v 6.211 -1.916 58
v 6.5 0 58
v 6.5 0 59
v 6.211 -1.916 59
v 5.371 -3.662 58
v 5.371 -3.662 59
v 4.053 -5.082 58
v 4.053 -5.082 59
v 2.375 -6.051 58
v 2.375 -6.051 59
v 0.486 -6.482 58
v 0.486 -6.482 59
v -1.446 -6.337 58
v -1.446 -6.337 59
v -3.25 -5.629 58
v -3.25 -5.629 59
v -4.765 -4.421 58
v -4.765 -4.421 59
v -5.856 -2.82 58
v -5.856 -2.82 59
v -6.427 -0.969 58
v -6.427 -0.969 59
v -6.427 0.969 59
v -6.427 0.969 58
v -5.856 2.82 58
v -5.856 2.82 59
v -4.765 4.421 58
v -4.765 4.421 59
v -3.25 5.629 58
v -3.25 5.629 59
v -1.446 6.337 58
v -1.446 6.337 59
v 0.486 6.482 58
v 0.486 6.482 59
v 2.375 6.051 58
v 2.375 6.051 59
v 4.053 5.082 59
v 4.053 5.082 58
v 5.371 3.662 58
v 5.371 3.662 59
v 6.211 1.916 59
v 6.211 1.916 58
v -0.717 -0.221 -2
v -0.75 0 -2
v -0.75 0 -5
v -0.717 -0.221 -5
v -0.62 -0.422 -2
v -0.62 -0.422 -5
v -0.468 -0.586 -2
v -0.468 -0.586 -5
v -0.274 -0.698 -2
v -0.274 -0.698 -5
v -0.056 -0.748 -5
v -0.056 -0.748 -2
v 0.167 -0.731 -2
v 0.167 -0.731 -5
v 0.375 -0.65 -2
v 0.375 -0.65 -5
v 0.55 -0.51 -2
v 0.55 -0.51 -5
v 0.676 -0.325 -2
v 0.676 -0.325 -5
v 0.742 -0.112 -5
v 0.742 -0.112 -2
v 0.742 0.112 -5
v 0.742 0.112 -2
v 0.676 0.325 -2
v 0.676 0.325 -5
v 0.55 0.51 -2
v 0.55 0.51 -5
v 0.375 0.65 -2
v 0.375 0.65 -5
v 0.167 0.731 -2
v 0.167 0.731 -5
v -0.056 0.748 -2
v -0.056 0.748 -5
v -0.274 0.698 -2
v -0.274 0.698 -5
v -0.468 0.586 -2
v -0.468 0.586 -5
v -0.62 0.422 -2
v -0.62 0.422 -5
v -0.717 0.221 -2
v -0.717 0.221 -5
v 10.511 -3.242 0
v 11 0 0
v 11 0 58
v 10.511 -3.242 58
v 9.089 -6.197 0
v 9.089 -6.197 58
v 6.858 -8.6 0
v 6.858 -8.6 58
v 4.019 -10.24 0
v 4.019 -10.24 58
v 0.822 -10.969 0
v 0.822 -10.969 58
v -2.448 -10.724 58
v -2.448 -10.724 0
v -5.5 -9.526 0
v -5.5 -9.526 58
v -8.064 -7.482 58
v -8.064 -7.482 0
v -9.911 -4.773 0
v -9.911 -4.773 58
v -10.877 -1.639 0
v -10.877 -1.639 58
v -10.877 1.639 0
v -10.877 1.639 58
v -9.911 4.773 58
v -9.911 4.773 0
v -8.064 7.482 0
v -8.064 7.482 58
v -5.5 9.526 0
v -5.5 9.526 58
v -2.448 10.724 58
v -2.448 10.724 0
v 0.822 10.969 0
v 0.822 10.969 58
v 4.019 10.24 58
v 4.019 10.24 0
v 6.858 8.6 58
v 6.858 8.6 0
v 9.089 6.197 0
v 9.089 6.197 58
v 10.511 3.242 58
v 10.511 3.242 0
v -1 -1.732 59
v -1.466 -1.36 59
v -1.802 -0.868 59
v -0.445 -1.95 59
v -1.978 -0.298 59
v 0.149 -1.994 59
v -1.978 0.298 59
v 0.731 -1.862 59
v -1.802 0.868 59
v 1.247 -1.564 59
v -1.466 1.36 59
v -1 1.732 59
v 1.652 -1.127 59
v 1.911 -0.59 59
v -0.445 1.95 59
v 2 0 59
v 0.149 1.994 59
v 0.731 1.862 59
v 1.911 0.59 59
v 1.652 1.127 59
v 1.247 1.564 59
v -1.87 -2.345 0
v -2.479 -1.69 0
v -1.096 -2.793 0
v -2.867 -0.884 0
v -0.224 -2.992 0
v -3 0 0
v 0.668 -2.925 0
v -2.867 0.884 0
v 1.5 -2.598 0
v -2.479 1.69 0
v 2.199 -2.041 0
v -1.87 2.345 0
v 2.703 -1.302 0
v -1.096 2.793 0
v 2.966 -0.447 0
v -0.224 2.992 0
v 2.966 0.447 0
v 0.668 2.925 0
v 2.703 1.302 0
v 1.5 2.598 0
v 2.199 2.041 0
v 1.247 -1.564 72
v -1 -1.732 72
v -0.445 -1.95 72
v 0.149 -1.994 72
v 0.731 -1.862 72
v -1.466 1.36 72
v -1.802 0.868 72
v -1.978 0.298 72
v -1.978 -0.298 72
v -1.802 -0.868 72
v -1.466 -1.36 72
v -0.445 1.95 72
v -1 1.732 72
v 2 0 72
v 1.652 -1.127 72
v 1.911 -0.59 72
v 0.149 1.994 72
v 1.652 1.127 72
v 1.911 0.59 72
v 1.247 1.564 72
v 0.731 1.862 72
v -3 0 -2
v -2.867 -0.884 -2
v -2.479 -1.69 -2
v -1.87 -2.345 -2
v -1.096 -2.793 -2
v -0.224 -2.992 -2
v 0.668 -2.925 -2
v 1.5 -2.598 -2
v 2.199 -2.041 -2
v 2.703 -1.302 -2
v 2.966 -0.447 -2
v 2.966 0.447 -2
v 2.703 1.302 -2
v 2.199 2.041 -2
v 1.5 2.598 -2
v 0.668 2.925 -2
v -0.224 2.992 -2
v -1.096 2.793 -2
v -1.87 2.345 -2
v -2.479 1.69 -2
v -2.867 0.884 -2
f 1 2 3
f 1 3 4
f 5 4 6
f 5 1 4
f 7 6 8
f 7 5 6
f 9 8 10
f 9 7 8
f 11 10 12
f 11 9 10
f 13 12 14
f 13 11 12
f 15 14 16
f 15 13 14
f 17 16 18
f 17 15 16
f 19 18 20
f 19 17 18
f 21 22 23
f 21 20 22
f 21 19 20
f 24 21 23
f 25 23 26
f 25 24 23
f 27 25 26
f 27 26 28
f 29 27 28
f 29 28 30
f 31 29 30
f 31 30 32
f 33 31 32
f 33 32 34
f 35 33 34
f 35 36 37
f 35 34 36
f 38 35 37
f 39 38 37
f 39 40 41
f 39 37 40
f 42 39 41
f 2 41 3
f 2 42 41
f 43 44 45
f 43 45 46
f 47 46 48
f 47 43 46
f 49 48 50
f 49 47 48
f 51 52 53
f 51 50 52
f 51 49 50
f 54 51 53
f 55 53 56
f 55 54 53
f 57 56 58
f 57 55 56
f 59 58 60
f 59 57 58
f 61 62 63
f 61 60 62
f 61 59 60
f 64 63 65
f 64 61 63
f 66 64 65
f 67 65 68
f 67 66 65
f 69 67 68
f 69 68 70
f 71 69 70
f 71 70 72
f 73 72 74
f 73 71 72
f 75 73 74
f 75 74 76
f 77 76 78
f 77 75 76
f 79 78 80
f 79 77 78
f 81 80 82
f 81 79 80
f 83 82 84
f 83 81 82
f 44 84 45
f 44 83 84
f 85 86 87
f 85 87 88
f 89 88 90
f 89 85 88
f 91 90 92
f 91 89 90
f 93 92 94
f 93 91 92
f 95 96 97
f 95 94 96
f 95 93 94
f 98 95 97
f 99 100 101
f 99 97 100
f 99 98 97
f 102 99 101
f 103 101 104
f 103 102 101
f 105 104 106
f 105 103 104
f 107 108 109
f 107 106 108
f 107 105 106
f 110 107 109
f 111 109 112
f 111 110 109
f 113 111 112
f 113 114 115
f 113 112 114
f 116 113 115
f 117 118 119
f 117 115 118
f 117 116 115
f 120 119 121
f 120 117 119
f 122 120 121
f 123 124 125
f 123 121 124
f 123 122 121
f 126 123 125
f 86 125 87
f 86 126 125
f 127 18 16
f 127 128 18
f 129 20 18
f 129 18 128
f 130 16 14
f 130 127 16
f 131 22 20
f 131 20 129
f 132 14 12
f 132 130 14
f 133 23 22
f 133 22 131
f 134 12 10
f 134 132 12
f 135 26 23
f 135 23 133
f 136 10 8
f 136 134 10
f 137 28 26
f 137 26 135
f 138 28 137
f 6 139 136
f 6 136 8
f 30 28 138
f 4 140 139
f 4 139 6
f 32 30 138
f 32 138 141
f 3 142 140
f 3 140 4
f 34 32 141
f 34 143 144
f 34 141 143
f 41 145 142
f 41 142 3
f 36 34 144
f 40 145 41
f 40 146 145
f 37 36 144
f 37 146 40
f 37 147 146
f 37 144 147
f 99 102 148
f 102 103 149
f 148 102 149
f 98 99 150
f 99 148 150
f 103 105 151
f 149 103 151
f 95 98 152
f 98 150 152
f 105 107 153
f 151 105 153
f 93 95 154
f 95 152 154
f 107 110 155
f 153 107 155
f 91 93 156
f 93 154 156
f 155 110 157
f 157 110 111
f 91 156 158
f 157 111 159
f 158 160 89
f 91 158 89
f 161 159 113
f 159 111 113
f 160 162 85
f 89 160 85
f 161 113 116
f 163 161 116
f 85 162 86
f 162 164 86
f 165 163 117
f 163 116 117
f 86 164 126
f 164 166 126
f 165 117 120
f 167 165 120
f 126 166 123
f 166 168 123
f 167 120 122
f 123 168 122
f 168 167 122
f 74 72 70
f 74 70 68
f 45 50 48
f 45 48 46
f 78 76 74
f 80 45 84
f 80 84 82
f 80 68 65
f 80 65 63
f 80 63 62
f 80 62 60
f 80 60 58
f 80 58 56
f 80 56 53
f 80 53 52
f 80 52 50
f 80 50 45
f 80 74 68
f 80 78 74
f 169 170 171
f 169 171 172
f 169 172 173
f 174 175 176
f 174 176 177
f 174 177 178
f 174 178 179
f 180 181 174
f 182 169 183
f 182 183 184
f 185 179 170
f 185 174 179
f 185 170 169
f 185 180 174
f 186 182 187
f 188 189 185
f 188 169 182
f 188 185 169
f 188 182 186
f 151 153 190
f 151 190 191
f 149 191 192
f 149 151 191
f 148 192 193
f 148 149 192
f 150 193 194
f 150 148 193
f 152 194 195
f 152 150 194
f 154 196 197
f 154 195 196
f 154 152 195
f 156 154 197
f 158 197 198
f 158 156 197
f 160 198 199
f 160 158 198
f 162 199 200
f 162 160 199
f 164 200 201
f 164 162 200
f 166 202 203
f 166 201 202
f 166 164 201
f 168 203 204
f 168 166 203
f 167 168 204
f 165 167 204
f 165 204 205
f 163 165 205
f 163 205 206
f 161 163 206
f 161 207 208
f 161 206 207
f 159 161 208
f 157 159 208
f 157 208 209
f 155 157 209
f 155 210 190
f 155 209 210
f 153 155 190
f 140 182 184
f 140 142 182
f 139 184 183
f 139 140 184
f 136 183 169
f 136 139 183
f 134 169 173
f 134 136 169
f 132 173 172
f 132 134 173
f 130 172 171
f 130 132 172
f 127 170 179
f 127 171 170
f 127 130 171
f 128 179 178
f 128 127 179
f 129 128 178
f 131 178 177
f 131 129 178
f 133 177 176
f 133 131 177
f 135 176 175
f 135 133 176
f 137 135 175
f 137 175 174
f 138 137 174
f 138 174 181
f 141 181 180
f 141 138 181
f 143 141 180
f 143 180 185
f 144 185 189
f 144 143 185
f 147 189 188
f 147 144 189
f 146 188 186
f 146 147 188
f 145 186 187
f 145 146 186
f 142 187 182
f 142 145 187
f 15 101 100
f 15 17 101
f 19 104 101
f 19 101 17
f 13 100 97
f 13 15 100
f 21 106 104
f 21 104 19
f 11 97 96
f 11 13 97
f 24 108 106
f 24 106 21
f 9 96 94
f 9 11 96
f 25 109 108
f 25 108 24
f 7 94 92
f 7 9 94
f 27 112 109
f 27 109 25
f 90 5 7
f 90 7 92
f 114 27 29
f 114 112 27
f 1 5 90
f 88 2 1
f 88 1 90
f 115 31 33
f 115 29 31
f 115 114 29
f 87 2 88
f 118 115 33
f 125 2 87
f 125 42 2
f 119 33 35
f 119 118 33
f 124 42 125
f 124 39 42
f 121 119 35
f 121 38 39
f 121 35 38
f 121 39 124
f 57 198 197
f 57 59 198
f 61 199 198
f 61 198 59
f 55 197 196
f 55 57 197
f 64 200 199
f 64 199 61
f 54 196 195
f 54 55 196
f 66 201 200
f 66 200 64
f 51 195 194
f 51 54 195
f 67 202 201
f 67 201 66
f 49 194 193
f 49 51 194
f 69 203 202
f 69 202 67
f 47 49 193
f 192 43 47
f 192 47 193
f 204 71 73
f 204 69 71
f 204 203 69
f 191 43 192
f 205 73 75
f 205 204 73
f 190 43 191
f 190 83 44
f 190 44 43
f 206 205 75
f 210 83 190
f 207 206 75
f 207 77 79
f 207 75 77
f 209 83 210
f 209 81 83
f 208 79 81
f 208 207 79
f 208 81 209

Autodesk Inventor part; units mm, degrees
ref_plane "YZ Plane" through (0, 0, 0) normal (1, 0, 0) x (0, 1, 0)
ref_plane "XZ Plane" through (0, 0, 0) normal (0, 1, 0) x (-1, 0, 0)
ref_plane "XY Plane" through (0, 0, 0) normal (0, 0, 1) x (1, 0, 0)
sketch "Skizze1" plane through (0, 0, 0) normal (0, 0, 1) x (1, 0, 0)
  circle A0 centre (0, 0) radius 11
  dimension "d0" = 22
extrude "Extrusion1" add sketch "Skizze1" along normal blind 58
sketch "Skizze2" plane through (0, 0, 58) normal (0, 0, 1) x (1, 0, 0)
  circle A0 centre (0, 0) radius 6.5
  dimension "d3" = 13
extrude "Extrusion2" add sketch "Skizze2" along normal blind 1
sketch "Skizze3" plane through (0, 0, 59) normal (0, 0, 1) x (1, 0, 0)
  circle A0 centre (0, 0) radius 2
  dimension "d6" = 4
extrude "Extrusion3" add sketch "Skizze3" along normal blind 13
sketch "Skizze5" plane through (0, 0, 0) normal (0, 0, -1) x (-1, 0, 0)
  circle A0 centre (0, 0) radius 2 projected
  circle A1 centre (0, 0) radius 3
  dimension "d10" = 6
extrude "Extrusion4" add sketch "Skizze5" along normal blind 2 contours A0 | A1
sketch "Skizze6" plane through (0, 0, -2) normal (0, 0, -1) x (-1, 0, 0)
  circle A0 centre (0, 0) radius 0.75
  dimension "d13" = 1.5
extrude "Extrusion5" add sketch "Skizze6" along normal blind 3
properties part number "Fake Motor"
